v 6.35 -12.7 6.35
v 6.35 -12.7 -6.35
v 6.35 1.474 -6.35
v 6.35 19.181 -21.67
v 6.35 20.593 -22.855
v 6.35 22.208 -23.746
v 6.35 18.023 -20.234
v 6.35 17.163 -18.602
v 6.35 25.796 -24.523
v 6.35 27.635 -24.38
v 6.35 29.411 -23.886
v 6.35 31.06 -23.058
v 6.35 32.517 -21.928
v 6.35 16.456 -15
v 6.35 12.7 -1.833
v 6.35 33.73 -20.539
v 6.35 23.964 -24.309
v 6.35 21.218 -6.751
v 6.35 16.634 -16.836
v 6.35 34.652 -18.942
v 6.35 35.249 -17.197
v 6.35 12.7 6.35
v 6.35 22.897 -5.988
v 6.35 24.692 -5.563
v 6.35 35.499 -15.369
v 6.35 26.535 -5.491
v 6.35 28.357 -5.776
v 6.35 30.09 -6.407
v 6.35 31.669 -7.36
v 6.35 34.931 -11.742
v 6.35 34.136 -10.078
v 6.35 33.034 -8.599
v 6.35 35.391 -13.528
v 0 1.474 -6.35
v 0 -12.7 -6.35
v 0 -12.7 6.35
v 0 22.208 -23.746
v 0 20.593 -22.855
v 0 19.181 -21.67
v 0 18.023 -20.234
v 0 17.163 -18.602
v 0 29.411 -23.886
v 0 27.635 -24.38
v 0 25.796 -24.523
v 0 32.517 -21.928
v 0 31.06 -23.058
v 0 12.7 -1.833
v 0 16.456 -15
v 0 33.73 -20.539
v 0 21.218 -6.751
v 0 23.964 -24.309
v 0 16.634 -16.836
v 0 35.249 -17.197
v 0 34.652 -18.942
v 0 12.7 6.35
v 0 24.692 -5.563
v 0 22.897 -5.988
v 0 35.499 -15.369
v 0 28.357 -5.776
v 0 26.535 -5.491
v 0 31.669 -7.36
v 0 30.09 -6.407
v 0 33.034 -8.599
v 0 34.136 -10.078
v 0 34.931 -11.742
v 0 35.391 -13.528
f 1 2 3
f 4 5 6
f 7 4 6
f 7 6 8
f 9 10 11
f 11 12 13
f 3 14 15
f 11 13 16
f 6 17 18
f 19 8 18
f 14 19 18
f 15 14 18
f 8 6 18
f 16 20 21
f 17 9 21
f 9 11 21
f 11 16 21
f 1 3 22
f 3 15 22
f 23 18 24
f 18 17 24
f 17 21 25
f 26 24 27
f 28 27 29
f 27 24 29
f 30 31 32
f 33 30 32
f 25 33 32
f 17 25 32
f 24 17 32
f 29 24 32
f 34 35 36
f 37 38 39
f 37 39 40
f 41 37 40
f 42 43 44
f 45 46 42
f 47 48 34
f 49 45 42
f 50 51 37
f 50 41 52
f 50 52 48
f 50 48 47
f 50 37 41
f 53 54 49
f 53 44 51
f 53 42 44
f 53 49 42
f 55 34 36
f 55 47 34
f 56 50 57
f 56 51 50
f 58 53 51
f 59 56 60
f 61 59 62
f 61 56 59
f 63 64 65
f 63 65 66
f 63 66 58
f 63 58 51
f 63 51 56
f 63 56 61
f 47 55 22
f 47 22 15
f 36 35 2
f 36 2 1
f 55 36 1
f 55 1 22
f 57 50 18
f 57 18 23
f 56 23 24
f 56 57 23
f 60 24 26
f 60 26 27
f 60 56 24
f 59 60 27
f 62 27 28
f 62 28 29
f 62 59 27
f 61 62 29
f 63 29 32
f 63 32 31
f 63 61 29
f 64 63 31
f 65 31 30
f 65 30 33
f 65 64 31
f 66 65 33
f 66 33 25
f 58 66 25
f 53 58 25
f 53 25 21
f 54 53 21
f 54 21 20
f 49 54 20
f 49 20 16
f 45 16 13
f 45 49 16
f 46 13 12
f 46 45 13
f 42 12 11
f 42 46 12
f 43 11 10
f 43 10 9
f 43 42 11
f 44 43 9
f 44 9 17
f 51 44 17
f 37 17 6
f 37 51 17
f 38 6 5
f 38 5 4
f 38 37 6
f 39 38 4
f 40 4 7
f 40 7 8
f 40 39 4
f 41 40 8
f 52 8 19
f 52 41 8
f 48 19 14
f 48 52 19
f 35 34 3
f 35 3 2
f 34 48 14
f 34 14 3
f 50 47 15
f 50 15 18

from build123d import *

# Parameters (mm, degrees)
BOSS_EXTRUDE1_DEPTH = 6.35


with BuildPart() as part:
    # Sketch1 → Boss-Extrude1 (new body)
    with BuildSketch(Plane(origin=(0, 0, 0), x_dir=(0, 0, -1), z_dir=(1, 0, 0))):
        with BuildLine():
            Line((-6.35, 12.7), (1.833087105, 12.7))
            Line((1.833087105, 12.7), (6.751108029, 21.218262114))
            ThreePointArc((6.751108029, 21.218262114), (19.7625, 34.229654085), (15, 16.455762114))
            Line((15, 16.455762114), (6.35, 1.473522628))
            Line((6.35, 1.473522628), (6.35, -12.7))
            Line((6.35, -12.7), (-6.35, -12.7))
            Line((-6.35, -12.7), (-6.35, 12.7))
        make_face()
    extrude(amount=BOSS_EXTRUDE1_DEPTH)


solid = part.part
